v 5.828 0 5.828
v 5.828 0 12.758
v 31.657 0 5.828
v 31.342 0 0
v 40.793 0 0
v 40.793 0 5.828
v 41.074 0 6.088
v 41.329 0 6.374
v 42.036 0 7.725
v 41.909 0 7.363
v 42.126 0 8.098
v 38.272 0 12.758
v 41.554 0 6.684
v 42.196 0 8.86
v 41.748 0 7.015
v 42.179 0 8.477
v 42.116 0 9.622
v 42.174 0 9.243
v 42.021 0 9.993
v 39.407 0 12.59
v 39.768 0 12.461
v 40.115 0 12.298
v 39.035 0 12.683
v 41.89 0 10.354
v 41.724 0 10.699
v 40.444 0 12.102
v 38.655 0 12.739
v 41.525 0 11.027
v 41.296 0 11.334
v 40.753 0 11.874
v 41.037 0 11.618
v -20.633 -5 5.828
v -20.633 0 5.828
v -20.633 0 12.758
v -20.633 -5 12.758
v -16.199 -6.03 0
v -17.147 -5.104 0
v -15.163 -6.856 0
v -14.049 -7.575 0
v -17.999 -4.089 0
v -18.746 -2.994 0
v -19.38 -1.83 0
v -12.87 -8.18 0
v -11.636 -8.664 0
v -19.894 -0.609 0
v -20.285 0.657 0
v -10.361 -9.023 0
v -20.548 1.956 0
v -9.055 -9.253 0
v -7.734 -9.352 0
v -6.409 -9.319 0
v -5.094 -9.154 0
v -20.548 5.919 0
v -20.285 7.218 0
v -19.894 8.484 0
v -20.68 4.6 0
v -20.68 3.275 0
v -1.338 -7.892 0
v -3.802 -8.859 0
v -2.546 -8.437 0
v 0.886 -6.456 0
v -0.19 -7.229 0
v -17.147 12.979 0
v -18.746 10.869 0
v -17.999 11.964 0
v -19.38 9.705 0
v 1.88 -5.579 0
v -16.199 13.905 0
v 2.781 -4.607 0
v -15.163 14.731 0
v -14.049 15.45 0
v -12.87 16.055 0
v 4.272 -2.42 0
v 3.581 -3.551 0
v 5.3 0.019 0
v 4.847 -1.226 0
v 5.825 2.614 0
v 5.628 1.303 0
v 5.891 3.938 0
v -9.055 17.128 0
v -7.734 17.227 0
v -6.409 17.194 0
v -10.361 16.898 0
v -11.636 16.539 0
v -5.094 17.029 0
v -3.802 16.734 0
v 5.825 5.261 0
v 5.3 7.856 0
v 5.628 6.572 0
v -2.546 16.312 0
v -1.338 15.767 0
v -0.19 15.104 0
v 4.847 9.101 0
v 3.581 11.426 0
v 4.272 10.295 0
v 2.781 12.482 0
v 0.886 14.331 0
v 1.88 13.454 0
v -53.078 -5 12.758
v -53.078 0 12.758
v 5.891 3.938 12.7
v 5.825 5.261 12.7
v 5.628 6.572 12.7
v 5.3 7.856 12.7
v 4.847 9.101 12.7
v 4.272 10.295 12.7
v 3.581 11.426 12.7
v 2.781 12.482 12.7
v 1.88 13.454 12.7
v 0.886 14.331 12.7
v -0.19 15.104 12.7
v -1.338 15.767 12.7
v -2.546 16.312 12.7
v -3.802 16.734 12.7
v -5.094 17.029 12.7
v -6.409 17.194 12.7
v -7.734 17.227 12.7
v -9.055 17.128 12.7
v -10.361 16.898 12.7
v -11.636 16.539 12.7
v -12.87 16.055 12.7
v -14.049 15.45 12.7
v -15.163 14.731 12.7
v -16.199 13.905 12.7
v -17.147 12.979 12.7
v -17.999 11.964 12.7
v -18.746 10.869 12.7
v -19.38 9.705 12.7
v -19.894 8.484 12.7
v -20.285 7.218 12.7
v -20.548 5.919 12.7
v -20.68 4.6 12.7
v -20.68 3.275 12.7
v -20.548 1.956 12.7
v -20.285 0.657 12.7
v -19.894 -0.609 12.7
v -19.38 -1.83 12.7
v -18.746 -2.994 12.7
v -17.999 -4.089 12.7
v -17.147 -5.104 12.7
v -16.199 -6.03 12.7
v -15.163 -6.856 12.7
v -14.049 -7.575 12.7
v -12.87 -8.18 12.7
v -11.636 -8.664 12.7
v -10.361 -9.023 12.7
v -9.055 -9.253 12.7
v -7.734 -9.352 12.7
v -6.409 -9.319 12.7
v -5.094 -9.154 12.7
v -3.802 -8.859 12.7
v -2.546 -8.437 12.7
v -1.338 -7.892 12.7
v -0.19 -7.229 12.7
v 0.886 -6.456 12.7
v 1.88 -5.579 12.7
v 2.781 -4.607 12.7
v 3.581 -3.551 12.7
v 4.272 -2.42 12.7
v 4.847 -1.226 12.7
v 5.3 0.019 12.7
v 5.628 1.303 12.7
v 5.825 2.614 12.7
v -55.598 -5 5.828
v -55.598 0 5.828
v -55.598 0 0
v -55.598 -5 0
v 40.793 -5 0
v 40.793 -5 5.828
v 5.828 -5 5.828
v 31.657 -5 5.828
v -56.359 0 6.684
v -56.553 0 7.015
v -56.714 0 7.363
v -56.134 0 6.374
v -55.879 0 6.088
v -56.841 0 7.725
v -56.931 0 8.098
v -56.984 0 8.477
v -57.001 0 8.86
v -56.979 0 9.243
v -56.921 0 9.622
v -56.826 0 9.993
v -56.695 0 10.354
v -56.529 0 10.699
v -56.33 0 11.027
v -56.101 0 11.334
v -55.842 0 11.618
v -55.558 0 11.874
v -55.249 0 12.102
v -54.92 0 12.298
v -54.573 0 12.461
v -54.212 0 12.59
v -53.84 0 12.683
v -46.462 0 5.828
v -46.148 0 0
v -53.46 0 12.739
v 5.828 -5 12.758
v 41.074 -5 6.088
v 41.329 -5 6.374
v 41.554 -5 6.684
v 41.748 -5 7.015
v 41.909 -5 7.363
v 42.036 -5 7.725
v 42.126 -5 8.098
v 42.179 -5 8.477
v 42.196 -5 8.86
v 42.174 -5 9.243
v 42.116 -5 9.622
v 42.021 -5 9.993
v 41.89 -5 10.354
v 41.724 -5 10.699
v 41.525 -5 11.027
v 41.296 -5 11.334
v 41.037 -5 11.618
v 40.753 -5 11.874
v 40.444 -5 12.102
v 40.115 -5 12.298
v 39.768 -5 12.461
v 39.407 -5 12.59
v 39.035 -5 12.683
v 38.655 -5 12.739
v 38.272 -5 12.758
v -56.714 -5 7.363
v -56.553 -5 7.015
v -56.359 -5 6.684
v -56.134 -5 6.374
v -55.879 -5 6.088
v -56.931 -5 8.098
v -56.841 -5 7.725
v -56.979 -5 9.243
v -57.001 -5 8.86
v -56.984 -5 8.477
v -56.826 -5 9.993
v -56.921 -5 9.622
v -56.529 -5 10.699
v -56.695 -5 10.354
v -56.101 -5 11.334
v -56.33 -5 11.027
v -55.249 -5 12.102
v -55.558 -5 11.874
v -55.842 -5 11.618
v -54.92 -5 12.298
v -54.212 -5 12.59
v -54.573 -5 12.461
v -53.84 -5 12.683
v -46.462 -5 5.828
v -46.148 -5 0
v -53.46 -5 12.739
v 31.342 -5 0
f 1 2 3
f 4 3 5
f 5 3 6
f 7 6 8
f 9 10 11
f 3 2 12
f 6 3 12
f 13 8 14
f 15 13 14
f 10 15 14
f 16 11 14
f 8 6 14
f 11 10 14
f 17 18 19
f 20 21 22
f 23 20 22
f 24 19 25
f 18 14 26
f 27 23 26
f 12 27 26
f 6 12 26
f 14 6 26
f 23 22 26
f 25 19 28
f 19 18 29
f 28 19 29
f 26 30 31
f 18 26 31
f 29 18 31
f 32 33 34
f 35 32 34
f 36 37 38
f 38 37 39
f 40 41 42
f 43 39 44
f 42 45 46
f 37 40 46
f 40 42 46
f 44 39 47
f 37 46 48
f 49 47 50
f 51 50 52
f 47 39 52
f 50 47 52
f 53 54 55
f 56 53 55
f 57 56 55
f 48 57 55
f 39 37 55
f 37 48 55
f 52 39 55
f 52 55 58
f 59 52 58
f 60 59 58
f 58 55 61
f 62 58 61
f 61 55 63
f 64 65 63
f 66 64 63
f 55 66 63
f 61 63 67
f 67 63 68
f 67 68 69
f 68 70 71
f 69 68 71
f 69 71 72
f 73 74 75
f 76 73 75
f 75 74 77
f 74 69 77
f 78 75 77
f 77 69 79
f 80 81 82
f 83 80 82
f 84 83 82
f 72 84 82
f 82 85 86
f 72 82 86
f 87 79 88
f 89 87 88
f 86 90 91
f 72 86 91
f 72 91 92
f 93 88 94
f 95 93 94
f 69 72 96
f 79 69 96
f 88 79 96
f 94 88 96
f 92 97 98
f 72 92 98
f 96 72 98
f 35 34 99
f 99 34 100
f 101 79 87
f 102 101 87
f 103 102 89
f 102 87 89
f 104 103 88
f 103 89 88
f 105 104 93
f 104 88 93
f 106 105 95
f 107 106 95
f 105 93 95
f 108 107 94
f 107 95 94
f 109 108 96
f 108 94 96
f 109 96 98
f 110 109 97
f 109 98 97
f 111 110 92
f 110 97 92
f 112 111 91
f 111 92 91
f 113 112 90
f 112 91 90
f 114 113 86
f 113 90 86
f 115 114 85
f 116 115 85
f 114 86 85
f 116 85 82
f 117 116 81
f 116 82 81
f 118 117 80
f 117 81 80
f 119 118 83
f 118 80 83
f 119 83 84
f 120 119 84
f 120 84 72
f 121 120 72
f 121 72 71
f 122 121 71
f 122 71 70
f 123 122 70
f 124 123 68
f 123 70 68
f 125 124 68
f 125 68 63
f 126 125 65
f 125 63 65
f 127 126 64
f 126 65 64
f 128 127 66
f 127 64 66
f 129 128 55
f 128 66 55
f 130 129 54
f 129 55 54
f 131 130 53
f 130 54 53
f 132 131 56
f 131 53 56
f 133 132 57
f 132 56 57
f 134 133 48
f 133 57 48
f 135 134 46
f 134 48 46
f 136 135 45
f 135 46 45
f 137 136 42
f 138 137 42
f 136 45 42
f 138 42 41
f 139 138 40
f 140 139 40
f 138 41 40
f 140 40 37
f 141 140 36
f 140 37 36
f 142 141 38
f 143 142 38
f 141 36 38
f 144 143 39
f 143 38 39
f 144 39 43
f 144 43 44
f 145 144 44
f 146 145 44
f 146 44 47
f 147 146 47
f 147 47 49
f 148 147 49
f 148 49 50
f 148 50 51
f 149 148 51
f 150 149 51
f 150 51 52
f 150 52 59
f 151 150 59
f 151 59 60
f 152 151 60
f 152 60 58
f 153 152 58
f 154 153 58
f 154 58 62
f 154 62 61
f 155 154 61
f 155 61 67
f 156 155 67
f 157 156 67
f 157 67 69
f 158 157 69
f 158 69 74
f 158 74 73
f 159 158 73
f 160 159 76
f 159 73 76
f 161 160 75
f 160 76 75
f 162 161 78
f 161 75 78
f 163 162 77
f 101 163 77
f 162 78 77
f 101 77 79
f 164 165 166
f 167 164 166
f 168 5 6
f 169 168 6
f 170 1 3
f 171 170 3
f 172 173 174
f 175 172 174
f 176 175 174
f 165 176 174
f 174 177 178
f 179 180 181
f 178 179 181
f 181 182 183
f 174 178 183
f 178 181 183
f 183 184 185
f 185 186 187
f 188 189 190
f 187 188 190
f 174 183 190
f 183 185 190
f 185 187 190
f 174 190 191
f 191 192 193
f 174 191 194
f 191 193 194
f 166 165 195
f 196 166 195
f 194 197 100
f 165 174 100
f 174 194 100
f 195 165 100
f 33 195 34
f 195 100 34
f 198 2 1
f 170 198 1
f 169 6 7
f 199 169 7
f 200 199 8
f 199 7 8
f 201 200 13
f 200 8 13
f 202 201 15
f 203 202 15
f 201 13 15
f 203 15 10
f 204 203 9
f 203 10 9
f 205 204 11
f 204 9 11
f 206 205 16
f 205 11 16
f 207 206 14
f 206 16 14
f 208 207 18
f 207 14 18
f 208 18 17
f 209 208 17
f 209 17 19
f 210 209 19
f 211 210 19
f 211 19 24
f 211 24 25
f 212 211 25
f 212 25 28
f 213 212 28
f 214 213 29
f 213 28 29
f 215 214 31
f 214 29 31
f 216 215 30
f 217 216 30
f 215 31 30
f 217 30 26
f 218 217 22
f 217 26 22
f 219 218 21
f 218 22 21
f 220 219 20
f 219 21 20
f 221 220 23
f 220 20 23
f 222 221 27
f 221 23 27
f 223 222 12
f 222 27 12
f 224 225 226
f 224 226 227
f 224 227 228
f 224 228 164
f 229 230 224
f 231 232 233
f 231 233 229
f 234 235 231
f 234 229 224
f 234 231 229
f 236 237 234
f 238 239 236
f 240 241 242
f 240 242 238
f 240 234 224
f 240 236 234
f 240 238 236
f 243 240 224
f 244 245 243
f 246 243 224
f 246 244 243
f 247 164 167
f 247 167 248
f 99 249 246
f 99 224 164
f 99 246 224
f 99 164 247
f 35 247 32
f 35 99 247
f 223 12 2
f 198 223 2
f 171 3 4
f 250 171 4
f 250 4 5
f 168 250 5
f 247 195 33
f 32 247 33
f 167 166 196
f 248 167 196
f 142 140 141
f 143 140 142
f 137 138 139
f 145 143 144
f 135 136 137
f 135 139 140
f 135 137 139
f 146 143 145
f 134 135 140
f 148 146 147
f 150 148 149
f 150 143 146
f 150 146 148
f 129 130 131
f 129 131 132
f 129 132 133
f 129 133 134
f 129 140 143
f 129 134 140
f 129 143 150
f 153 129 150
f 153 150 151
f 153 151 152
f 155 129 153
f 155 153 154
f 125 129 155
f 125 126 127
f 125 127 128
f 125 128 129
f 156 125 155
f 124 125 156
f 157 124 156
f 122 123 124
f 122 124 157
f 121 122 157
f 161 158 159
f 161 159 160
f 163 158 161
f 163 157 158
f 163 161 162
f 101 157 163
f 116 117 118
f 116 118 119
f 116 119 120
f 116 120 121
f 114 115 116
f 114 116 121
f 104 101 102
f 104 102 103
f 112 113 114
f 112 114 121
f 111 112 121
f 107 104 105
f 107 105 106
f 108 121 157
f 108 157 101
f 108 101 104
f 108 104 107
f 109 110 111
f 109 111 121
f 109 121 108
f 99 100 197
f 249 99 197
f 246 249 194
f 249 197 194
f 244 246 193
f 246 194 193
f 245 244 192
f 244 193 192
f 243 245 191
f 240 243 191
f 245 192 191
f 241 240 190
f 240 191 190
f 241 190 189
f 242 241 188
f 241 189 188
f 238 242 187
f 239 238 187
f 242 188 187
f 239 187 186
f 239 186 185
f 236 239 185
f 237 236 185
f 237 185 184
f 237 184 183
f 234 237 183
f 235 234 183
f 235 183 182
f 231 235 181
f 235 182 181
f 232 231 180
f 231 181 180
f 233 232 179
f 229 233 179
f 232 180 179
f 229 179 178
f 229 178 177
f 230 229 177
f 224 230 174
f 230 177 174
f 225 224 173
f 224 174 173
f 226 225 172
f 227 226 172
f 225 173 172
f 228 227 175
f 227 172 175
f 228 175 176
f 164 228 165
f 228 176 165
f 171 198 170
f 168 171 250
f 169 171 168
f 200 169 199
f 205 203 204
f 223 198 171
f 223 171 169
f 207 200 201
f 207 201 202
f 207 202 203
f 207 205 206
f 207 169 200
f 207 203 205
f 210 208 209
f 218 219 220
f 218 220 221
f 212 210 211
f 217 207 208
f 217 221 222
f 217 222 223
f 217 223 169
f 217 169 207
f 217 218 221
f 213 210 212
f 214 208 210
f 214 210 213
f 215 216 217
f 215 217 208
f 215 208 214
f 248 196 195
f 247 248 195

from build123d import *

# Parameters (mm, degrees)
F0_R     = 13.293597
F1_DEPTH = 12.7
F3_DEPTH = 5


with BuildPart() as f1:
    # F0 (on Top) → F1 (new body)
    with BuildSketch(Plane.XY):
        with Locations((-7.402501, 3.9375)):
            Circle(F0_R)
    extrude(amount=F1_DEPTH)


with BuildPart() as f3:
    # F2 (on Front) → F3 (new body)
    with BuildSketch(Plane.XZ):
        with BuildLine():
            Line((38.2725, 12.7575), (5.827501, 12.7575))
            Line((5.827501, 12.7575), (5.827501, 5.8275))
            Line((5.827501, 5.8275), (31.657498, 5.8275))
            Line((31.657498, 5.8275), (31.342499, 0))
            Line((31.342499, 0), (40.792502, 0))
            Line((40.792502, 0), (40.792502, 5.8275))
            ThreePointArc((40.792502, 5.8275), (41.959481, 10.175039), (38.2725, 12.7575))
        make_face()
        with BuildLine():
            Line((-20.632504, 5.8275), (-20.632504, 12.7575))
            Line((-20.632504, 12.7575), (-53.077502, 12.7575))
            ThreePointArc((-53.077502, 12.7575), (-56.764483, 10.175039), (-55.597505, 5.8275))
            Line((-55.597505, 5.8275), (-55.597505, 0))
            Line((-55.597505, 0), (-46.147501, 0))
            Line((-46.147501, 0), (-46.4625, 5.8275))
            Line((-46.4625, 5.8275), (-20.632504, 5.8275))
        make_face()
    extrude(amount=F3_DEPTH)


solid = Compound([f1.part, f3.part])
